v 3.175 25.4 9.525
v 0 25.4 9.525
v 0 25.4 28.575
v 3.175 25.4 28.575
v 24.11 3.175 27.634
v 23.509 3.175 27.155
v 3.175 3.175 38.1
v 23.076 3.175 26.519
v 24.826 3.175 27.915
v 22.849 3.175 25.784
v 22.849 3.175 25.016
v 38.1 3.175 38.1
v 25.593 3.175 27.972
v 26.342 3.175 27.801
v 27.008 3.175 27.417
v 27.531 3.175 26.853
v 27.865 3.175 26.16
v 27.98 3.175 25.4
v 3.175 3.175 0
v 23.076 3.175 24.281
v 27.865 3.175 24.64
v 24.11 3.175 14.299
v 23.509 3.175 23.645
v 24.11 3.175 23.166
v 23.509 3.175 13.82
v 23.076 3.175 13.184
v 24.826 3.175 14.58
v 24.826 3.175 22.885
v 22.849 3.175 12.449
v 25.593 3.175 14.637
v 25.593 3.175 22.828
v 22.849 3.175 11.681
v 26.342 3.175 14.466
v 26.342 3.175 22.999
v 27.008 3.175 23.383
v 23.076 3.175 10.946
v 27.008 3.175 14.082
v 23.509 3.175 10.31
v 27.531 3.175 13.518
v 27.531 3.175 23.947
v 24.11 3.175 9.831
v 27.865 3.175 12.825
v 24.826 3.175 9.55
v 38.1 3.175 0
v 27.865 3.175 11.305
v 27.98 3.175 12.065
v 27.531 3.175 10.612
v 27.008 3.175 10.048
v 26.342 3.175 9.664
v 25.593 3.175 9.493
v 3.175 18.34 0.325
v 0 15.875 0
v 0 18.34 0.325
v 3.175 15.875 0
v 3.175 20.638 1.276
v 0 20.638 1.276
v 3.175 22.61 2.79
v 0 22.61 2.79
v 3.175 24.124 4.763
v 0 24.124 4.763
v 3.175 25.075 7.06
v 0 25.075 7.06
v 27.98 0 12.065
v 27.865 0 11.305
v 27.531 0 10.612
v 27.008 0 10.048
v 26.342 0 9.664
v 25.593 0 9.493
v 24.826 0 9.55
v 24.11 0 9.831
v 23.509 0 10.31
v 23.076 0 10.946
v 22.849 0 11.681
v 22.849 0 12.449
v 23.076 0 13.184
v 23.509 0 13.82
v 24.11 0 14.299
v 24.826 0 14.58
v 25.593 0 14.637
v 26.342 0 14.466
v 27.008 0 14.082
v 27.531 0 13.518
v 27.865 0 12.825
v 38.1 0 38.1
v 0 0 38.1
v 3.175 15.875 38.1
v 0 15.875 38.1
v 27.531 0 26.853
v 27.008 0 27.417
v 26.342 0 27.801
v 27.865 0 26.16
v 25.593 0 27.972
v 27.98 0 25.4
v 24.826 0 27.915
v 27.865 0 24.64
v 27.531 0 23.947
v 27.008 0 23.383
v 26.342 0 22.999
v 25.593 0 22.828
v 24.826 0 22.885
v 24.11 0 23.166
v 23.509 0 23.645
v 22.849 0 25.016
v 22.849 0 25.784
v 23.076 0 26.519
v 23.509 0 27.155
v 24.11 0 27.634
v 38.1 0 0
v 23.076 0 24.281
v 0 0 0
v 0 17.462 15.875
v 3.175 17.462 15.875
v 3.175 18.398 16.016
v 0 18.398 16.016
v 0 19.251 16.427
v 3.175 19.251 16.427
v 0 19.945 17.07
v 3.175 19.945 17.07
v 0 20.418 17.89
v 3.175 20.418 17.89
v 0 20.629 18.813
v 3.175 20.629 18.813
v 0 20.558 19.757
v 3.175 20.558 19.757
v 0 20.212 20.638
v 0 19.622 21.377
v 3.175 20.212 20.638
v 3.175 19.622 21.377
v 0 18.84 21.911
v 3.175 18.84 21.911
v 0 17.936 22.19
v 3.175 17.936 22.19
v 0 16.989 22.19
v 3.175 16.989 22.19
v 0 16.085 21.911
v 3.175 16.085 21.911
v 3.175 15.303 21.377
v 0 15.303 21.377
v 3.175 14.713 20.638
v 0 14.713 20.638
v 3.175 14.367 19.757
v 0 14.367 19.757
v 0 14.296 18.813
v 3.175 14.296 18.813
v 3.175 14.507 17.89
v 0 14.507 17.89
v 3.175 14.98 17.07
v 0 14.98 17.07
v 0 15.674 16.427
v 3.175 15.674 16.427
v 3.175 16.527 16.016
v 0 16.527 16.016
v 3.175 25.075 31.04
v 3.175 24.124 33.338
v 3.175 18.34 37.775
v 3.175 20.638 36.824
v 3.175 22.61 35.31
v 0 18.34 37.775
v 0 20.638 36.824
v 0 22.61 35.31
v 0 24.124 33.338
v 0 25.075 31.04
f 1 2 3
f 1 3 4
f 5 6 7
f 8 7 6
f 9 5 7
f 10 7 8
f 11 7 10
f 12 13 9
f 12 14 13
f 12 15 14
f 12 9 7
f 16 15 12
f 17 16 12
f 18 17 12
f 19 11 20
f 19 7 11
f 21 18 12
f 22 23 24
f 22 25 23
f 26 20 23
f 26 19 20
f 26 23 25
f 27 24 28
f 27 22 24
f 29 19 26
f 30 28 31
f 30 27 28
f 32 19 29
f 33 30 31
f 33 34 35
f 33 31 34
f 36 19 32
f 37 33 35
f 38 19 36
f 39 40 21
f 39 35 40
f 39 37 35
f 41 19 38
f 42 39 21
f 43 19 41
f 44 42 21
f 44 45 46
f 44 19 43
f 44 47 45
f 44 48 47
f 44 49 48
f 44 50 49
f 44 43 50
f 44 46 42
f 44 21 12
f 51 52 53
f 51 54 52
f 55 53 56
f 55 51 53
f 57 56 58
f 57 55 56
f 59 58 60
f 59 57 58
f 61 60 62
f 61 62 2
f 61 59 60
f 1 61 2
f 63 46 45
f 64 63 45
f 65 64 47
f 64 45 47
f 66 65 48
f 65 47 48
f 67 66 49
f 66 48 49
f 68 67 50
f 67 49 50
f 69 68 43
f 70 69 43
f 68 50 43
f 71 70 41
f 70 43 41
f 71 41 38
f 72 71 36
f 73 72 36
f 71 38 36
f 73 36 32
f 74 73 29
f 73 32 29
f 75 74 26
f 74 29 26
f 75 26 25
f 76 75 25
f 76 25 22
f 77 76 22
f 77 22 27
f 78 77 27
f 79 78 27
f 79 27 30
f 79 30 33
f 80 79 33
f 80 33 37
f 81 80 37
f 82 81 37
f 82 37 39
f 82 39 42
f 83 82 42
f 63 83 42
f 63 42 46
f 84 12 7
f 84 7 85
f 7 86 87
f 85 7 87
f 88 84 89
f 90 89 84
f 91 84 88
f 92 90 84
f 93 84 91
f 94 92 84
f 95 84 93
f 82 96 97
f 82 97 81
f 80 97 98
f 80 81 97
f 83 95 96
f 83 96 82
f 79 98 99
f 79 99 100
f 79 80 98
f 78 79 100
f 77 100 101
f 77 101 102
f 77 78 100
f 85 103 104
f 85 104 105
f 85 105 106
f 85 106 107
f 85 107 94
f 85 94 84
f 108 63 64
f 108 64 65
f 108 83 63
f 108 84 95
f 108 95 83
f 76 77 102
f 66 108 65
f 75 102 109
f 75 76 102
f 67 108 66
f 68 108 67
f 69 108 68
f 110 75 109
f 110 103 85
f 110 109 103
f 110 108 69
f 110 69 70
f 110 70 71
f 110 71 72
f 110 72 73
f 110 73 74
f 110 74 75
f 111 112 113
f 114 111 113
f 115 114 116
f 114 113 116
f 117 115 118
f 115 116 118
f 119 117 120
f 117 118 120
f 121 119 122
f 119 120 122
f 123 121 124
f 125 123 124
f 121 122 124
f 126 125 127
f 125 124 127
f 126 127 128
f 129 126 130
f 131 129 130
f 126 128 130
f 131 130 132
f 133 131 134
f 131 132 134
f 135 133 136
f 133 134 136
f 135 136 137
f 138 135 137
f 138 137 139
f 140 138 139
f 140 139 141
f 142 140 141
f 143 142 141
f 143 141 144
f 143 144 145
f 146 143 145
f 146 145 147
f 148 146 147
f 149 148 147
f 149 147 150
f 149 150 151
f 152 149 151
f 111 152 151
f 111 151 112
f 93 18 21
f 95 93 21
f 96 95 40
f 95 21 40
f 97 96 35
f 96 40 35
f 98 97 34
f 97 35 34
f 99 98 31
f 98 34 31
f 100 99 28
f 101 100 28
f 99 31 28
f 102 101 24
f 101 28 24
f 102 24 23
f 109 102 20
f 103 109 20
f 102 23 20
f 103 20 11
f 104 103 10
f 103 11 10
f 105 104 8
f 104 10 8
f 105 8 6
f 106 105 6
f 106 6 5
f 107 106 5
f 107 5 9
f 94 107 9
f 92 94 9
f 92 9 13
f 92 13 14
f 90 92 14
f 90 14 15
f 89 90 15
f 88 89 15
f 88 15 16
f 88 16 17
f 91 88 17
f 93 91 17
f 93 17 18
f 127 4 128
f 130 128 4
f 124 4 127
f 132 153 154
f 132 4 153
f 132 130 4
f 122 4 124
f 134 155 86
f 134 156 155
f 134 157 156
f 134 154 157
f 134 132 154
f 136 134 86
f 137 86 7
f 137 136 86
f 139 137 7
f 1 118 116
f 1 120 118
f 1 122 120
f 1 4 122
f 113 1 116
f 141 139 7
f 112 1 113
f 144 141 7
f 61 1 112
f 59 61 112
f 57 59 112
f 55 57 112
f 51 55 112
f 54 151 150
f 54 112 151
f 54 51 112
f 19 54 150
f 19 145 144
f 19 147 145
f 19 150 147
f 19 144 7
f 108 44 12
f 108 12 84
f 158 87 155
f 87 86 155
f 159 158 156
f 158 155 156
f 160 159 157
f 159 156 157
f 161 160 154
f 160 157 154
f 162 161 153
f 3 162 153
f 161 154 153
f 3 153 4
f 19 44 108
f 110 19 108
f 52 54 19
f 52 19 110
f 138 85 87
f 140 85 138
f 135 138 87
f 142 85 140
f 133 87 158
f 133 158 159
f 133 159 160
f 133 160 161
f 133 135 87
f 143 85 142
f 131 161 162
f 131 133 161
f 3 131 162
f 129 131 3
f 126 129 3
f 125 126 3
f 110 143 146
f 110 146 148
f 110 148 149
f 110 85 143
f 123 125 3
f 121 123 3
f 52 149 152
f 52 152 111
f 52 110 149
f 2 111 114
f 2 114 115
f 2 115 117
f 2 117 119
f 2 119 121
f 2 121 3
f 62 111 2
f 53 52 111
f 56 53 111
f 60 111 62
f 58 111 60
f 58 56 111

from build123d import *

# Parameters (mm, degrees)
BOSS_EXTRUDE1_DEPTH              = 38.1
F_13_64_0_20313_DIAMETER_HOLE1_D = 5.159375
F_1_4_0_25_DIAMETER_HOLE2_D      = 6.35
FILLET1_R                        = 9.525


with BuildPart() as part:
    # Sketch1 → Boss-Extrude1 (new body)
    with BuildSketch(Plane.XY):
        Polygon((0, 0), (0, 25.4), (3.175, 25.4), (3.175, 3.175), (38.1, 3.175), (38.1, 0), align=None)
    extrude(amount=BOSS_EXTRUDE1_DEPTH)

    # 13/64 (0.20313) Diameter Hole1 (through all)
    with Locations(Plane(origin=(0, 0, 0), x_dir=(-1, 0, 0), z_dir=(0, -1, 0))):
        with Locations((-25.4, -25.4), (-25.4, -12.065)):
            Hole(F_13_64_0_20313_DIAMETER_HOLE1_D / 2)

    # 1/4 (0.25) Diameter Hole2 (through all)
    with Locations(Plane.ZY):
        with Locations((19.05, 17.4625)):
            Hole(F_1_4_0_25_DIAMETER_HOLE2_D / 2)

    # Fillet1
    fillet1_edges = [part.edges().sort_by_distance(p)[0] for p in [
        (1.5875, 25.4, 38.1),
        (1.5875, 25.4, 0),
    ]]
    fillet(fillet1_edges, radius=FILLET1_R)


solid = part.part
